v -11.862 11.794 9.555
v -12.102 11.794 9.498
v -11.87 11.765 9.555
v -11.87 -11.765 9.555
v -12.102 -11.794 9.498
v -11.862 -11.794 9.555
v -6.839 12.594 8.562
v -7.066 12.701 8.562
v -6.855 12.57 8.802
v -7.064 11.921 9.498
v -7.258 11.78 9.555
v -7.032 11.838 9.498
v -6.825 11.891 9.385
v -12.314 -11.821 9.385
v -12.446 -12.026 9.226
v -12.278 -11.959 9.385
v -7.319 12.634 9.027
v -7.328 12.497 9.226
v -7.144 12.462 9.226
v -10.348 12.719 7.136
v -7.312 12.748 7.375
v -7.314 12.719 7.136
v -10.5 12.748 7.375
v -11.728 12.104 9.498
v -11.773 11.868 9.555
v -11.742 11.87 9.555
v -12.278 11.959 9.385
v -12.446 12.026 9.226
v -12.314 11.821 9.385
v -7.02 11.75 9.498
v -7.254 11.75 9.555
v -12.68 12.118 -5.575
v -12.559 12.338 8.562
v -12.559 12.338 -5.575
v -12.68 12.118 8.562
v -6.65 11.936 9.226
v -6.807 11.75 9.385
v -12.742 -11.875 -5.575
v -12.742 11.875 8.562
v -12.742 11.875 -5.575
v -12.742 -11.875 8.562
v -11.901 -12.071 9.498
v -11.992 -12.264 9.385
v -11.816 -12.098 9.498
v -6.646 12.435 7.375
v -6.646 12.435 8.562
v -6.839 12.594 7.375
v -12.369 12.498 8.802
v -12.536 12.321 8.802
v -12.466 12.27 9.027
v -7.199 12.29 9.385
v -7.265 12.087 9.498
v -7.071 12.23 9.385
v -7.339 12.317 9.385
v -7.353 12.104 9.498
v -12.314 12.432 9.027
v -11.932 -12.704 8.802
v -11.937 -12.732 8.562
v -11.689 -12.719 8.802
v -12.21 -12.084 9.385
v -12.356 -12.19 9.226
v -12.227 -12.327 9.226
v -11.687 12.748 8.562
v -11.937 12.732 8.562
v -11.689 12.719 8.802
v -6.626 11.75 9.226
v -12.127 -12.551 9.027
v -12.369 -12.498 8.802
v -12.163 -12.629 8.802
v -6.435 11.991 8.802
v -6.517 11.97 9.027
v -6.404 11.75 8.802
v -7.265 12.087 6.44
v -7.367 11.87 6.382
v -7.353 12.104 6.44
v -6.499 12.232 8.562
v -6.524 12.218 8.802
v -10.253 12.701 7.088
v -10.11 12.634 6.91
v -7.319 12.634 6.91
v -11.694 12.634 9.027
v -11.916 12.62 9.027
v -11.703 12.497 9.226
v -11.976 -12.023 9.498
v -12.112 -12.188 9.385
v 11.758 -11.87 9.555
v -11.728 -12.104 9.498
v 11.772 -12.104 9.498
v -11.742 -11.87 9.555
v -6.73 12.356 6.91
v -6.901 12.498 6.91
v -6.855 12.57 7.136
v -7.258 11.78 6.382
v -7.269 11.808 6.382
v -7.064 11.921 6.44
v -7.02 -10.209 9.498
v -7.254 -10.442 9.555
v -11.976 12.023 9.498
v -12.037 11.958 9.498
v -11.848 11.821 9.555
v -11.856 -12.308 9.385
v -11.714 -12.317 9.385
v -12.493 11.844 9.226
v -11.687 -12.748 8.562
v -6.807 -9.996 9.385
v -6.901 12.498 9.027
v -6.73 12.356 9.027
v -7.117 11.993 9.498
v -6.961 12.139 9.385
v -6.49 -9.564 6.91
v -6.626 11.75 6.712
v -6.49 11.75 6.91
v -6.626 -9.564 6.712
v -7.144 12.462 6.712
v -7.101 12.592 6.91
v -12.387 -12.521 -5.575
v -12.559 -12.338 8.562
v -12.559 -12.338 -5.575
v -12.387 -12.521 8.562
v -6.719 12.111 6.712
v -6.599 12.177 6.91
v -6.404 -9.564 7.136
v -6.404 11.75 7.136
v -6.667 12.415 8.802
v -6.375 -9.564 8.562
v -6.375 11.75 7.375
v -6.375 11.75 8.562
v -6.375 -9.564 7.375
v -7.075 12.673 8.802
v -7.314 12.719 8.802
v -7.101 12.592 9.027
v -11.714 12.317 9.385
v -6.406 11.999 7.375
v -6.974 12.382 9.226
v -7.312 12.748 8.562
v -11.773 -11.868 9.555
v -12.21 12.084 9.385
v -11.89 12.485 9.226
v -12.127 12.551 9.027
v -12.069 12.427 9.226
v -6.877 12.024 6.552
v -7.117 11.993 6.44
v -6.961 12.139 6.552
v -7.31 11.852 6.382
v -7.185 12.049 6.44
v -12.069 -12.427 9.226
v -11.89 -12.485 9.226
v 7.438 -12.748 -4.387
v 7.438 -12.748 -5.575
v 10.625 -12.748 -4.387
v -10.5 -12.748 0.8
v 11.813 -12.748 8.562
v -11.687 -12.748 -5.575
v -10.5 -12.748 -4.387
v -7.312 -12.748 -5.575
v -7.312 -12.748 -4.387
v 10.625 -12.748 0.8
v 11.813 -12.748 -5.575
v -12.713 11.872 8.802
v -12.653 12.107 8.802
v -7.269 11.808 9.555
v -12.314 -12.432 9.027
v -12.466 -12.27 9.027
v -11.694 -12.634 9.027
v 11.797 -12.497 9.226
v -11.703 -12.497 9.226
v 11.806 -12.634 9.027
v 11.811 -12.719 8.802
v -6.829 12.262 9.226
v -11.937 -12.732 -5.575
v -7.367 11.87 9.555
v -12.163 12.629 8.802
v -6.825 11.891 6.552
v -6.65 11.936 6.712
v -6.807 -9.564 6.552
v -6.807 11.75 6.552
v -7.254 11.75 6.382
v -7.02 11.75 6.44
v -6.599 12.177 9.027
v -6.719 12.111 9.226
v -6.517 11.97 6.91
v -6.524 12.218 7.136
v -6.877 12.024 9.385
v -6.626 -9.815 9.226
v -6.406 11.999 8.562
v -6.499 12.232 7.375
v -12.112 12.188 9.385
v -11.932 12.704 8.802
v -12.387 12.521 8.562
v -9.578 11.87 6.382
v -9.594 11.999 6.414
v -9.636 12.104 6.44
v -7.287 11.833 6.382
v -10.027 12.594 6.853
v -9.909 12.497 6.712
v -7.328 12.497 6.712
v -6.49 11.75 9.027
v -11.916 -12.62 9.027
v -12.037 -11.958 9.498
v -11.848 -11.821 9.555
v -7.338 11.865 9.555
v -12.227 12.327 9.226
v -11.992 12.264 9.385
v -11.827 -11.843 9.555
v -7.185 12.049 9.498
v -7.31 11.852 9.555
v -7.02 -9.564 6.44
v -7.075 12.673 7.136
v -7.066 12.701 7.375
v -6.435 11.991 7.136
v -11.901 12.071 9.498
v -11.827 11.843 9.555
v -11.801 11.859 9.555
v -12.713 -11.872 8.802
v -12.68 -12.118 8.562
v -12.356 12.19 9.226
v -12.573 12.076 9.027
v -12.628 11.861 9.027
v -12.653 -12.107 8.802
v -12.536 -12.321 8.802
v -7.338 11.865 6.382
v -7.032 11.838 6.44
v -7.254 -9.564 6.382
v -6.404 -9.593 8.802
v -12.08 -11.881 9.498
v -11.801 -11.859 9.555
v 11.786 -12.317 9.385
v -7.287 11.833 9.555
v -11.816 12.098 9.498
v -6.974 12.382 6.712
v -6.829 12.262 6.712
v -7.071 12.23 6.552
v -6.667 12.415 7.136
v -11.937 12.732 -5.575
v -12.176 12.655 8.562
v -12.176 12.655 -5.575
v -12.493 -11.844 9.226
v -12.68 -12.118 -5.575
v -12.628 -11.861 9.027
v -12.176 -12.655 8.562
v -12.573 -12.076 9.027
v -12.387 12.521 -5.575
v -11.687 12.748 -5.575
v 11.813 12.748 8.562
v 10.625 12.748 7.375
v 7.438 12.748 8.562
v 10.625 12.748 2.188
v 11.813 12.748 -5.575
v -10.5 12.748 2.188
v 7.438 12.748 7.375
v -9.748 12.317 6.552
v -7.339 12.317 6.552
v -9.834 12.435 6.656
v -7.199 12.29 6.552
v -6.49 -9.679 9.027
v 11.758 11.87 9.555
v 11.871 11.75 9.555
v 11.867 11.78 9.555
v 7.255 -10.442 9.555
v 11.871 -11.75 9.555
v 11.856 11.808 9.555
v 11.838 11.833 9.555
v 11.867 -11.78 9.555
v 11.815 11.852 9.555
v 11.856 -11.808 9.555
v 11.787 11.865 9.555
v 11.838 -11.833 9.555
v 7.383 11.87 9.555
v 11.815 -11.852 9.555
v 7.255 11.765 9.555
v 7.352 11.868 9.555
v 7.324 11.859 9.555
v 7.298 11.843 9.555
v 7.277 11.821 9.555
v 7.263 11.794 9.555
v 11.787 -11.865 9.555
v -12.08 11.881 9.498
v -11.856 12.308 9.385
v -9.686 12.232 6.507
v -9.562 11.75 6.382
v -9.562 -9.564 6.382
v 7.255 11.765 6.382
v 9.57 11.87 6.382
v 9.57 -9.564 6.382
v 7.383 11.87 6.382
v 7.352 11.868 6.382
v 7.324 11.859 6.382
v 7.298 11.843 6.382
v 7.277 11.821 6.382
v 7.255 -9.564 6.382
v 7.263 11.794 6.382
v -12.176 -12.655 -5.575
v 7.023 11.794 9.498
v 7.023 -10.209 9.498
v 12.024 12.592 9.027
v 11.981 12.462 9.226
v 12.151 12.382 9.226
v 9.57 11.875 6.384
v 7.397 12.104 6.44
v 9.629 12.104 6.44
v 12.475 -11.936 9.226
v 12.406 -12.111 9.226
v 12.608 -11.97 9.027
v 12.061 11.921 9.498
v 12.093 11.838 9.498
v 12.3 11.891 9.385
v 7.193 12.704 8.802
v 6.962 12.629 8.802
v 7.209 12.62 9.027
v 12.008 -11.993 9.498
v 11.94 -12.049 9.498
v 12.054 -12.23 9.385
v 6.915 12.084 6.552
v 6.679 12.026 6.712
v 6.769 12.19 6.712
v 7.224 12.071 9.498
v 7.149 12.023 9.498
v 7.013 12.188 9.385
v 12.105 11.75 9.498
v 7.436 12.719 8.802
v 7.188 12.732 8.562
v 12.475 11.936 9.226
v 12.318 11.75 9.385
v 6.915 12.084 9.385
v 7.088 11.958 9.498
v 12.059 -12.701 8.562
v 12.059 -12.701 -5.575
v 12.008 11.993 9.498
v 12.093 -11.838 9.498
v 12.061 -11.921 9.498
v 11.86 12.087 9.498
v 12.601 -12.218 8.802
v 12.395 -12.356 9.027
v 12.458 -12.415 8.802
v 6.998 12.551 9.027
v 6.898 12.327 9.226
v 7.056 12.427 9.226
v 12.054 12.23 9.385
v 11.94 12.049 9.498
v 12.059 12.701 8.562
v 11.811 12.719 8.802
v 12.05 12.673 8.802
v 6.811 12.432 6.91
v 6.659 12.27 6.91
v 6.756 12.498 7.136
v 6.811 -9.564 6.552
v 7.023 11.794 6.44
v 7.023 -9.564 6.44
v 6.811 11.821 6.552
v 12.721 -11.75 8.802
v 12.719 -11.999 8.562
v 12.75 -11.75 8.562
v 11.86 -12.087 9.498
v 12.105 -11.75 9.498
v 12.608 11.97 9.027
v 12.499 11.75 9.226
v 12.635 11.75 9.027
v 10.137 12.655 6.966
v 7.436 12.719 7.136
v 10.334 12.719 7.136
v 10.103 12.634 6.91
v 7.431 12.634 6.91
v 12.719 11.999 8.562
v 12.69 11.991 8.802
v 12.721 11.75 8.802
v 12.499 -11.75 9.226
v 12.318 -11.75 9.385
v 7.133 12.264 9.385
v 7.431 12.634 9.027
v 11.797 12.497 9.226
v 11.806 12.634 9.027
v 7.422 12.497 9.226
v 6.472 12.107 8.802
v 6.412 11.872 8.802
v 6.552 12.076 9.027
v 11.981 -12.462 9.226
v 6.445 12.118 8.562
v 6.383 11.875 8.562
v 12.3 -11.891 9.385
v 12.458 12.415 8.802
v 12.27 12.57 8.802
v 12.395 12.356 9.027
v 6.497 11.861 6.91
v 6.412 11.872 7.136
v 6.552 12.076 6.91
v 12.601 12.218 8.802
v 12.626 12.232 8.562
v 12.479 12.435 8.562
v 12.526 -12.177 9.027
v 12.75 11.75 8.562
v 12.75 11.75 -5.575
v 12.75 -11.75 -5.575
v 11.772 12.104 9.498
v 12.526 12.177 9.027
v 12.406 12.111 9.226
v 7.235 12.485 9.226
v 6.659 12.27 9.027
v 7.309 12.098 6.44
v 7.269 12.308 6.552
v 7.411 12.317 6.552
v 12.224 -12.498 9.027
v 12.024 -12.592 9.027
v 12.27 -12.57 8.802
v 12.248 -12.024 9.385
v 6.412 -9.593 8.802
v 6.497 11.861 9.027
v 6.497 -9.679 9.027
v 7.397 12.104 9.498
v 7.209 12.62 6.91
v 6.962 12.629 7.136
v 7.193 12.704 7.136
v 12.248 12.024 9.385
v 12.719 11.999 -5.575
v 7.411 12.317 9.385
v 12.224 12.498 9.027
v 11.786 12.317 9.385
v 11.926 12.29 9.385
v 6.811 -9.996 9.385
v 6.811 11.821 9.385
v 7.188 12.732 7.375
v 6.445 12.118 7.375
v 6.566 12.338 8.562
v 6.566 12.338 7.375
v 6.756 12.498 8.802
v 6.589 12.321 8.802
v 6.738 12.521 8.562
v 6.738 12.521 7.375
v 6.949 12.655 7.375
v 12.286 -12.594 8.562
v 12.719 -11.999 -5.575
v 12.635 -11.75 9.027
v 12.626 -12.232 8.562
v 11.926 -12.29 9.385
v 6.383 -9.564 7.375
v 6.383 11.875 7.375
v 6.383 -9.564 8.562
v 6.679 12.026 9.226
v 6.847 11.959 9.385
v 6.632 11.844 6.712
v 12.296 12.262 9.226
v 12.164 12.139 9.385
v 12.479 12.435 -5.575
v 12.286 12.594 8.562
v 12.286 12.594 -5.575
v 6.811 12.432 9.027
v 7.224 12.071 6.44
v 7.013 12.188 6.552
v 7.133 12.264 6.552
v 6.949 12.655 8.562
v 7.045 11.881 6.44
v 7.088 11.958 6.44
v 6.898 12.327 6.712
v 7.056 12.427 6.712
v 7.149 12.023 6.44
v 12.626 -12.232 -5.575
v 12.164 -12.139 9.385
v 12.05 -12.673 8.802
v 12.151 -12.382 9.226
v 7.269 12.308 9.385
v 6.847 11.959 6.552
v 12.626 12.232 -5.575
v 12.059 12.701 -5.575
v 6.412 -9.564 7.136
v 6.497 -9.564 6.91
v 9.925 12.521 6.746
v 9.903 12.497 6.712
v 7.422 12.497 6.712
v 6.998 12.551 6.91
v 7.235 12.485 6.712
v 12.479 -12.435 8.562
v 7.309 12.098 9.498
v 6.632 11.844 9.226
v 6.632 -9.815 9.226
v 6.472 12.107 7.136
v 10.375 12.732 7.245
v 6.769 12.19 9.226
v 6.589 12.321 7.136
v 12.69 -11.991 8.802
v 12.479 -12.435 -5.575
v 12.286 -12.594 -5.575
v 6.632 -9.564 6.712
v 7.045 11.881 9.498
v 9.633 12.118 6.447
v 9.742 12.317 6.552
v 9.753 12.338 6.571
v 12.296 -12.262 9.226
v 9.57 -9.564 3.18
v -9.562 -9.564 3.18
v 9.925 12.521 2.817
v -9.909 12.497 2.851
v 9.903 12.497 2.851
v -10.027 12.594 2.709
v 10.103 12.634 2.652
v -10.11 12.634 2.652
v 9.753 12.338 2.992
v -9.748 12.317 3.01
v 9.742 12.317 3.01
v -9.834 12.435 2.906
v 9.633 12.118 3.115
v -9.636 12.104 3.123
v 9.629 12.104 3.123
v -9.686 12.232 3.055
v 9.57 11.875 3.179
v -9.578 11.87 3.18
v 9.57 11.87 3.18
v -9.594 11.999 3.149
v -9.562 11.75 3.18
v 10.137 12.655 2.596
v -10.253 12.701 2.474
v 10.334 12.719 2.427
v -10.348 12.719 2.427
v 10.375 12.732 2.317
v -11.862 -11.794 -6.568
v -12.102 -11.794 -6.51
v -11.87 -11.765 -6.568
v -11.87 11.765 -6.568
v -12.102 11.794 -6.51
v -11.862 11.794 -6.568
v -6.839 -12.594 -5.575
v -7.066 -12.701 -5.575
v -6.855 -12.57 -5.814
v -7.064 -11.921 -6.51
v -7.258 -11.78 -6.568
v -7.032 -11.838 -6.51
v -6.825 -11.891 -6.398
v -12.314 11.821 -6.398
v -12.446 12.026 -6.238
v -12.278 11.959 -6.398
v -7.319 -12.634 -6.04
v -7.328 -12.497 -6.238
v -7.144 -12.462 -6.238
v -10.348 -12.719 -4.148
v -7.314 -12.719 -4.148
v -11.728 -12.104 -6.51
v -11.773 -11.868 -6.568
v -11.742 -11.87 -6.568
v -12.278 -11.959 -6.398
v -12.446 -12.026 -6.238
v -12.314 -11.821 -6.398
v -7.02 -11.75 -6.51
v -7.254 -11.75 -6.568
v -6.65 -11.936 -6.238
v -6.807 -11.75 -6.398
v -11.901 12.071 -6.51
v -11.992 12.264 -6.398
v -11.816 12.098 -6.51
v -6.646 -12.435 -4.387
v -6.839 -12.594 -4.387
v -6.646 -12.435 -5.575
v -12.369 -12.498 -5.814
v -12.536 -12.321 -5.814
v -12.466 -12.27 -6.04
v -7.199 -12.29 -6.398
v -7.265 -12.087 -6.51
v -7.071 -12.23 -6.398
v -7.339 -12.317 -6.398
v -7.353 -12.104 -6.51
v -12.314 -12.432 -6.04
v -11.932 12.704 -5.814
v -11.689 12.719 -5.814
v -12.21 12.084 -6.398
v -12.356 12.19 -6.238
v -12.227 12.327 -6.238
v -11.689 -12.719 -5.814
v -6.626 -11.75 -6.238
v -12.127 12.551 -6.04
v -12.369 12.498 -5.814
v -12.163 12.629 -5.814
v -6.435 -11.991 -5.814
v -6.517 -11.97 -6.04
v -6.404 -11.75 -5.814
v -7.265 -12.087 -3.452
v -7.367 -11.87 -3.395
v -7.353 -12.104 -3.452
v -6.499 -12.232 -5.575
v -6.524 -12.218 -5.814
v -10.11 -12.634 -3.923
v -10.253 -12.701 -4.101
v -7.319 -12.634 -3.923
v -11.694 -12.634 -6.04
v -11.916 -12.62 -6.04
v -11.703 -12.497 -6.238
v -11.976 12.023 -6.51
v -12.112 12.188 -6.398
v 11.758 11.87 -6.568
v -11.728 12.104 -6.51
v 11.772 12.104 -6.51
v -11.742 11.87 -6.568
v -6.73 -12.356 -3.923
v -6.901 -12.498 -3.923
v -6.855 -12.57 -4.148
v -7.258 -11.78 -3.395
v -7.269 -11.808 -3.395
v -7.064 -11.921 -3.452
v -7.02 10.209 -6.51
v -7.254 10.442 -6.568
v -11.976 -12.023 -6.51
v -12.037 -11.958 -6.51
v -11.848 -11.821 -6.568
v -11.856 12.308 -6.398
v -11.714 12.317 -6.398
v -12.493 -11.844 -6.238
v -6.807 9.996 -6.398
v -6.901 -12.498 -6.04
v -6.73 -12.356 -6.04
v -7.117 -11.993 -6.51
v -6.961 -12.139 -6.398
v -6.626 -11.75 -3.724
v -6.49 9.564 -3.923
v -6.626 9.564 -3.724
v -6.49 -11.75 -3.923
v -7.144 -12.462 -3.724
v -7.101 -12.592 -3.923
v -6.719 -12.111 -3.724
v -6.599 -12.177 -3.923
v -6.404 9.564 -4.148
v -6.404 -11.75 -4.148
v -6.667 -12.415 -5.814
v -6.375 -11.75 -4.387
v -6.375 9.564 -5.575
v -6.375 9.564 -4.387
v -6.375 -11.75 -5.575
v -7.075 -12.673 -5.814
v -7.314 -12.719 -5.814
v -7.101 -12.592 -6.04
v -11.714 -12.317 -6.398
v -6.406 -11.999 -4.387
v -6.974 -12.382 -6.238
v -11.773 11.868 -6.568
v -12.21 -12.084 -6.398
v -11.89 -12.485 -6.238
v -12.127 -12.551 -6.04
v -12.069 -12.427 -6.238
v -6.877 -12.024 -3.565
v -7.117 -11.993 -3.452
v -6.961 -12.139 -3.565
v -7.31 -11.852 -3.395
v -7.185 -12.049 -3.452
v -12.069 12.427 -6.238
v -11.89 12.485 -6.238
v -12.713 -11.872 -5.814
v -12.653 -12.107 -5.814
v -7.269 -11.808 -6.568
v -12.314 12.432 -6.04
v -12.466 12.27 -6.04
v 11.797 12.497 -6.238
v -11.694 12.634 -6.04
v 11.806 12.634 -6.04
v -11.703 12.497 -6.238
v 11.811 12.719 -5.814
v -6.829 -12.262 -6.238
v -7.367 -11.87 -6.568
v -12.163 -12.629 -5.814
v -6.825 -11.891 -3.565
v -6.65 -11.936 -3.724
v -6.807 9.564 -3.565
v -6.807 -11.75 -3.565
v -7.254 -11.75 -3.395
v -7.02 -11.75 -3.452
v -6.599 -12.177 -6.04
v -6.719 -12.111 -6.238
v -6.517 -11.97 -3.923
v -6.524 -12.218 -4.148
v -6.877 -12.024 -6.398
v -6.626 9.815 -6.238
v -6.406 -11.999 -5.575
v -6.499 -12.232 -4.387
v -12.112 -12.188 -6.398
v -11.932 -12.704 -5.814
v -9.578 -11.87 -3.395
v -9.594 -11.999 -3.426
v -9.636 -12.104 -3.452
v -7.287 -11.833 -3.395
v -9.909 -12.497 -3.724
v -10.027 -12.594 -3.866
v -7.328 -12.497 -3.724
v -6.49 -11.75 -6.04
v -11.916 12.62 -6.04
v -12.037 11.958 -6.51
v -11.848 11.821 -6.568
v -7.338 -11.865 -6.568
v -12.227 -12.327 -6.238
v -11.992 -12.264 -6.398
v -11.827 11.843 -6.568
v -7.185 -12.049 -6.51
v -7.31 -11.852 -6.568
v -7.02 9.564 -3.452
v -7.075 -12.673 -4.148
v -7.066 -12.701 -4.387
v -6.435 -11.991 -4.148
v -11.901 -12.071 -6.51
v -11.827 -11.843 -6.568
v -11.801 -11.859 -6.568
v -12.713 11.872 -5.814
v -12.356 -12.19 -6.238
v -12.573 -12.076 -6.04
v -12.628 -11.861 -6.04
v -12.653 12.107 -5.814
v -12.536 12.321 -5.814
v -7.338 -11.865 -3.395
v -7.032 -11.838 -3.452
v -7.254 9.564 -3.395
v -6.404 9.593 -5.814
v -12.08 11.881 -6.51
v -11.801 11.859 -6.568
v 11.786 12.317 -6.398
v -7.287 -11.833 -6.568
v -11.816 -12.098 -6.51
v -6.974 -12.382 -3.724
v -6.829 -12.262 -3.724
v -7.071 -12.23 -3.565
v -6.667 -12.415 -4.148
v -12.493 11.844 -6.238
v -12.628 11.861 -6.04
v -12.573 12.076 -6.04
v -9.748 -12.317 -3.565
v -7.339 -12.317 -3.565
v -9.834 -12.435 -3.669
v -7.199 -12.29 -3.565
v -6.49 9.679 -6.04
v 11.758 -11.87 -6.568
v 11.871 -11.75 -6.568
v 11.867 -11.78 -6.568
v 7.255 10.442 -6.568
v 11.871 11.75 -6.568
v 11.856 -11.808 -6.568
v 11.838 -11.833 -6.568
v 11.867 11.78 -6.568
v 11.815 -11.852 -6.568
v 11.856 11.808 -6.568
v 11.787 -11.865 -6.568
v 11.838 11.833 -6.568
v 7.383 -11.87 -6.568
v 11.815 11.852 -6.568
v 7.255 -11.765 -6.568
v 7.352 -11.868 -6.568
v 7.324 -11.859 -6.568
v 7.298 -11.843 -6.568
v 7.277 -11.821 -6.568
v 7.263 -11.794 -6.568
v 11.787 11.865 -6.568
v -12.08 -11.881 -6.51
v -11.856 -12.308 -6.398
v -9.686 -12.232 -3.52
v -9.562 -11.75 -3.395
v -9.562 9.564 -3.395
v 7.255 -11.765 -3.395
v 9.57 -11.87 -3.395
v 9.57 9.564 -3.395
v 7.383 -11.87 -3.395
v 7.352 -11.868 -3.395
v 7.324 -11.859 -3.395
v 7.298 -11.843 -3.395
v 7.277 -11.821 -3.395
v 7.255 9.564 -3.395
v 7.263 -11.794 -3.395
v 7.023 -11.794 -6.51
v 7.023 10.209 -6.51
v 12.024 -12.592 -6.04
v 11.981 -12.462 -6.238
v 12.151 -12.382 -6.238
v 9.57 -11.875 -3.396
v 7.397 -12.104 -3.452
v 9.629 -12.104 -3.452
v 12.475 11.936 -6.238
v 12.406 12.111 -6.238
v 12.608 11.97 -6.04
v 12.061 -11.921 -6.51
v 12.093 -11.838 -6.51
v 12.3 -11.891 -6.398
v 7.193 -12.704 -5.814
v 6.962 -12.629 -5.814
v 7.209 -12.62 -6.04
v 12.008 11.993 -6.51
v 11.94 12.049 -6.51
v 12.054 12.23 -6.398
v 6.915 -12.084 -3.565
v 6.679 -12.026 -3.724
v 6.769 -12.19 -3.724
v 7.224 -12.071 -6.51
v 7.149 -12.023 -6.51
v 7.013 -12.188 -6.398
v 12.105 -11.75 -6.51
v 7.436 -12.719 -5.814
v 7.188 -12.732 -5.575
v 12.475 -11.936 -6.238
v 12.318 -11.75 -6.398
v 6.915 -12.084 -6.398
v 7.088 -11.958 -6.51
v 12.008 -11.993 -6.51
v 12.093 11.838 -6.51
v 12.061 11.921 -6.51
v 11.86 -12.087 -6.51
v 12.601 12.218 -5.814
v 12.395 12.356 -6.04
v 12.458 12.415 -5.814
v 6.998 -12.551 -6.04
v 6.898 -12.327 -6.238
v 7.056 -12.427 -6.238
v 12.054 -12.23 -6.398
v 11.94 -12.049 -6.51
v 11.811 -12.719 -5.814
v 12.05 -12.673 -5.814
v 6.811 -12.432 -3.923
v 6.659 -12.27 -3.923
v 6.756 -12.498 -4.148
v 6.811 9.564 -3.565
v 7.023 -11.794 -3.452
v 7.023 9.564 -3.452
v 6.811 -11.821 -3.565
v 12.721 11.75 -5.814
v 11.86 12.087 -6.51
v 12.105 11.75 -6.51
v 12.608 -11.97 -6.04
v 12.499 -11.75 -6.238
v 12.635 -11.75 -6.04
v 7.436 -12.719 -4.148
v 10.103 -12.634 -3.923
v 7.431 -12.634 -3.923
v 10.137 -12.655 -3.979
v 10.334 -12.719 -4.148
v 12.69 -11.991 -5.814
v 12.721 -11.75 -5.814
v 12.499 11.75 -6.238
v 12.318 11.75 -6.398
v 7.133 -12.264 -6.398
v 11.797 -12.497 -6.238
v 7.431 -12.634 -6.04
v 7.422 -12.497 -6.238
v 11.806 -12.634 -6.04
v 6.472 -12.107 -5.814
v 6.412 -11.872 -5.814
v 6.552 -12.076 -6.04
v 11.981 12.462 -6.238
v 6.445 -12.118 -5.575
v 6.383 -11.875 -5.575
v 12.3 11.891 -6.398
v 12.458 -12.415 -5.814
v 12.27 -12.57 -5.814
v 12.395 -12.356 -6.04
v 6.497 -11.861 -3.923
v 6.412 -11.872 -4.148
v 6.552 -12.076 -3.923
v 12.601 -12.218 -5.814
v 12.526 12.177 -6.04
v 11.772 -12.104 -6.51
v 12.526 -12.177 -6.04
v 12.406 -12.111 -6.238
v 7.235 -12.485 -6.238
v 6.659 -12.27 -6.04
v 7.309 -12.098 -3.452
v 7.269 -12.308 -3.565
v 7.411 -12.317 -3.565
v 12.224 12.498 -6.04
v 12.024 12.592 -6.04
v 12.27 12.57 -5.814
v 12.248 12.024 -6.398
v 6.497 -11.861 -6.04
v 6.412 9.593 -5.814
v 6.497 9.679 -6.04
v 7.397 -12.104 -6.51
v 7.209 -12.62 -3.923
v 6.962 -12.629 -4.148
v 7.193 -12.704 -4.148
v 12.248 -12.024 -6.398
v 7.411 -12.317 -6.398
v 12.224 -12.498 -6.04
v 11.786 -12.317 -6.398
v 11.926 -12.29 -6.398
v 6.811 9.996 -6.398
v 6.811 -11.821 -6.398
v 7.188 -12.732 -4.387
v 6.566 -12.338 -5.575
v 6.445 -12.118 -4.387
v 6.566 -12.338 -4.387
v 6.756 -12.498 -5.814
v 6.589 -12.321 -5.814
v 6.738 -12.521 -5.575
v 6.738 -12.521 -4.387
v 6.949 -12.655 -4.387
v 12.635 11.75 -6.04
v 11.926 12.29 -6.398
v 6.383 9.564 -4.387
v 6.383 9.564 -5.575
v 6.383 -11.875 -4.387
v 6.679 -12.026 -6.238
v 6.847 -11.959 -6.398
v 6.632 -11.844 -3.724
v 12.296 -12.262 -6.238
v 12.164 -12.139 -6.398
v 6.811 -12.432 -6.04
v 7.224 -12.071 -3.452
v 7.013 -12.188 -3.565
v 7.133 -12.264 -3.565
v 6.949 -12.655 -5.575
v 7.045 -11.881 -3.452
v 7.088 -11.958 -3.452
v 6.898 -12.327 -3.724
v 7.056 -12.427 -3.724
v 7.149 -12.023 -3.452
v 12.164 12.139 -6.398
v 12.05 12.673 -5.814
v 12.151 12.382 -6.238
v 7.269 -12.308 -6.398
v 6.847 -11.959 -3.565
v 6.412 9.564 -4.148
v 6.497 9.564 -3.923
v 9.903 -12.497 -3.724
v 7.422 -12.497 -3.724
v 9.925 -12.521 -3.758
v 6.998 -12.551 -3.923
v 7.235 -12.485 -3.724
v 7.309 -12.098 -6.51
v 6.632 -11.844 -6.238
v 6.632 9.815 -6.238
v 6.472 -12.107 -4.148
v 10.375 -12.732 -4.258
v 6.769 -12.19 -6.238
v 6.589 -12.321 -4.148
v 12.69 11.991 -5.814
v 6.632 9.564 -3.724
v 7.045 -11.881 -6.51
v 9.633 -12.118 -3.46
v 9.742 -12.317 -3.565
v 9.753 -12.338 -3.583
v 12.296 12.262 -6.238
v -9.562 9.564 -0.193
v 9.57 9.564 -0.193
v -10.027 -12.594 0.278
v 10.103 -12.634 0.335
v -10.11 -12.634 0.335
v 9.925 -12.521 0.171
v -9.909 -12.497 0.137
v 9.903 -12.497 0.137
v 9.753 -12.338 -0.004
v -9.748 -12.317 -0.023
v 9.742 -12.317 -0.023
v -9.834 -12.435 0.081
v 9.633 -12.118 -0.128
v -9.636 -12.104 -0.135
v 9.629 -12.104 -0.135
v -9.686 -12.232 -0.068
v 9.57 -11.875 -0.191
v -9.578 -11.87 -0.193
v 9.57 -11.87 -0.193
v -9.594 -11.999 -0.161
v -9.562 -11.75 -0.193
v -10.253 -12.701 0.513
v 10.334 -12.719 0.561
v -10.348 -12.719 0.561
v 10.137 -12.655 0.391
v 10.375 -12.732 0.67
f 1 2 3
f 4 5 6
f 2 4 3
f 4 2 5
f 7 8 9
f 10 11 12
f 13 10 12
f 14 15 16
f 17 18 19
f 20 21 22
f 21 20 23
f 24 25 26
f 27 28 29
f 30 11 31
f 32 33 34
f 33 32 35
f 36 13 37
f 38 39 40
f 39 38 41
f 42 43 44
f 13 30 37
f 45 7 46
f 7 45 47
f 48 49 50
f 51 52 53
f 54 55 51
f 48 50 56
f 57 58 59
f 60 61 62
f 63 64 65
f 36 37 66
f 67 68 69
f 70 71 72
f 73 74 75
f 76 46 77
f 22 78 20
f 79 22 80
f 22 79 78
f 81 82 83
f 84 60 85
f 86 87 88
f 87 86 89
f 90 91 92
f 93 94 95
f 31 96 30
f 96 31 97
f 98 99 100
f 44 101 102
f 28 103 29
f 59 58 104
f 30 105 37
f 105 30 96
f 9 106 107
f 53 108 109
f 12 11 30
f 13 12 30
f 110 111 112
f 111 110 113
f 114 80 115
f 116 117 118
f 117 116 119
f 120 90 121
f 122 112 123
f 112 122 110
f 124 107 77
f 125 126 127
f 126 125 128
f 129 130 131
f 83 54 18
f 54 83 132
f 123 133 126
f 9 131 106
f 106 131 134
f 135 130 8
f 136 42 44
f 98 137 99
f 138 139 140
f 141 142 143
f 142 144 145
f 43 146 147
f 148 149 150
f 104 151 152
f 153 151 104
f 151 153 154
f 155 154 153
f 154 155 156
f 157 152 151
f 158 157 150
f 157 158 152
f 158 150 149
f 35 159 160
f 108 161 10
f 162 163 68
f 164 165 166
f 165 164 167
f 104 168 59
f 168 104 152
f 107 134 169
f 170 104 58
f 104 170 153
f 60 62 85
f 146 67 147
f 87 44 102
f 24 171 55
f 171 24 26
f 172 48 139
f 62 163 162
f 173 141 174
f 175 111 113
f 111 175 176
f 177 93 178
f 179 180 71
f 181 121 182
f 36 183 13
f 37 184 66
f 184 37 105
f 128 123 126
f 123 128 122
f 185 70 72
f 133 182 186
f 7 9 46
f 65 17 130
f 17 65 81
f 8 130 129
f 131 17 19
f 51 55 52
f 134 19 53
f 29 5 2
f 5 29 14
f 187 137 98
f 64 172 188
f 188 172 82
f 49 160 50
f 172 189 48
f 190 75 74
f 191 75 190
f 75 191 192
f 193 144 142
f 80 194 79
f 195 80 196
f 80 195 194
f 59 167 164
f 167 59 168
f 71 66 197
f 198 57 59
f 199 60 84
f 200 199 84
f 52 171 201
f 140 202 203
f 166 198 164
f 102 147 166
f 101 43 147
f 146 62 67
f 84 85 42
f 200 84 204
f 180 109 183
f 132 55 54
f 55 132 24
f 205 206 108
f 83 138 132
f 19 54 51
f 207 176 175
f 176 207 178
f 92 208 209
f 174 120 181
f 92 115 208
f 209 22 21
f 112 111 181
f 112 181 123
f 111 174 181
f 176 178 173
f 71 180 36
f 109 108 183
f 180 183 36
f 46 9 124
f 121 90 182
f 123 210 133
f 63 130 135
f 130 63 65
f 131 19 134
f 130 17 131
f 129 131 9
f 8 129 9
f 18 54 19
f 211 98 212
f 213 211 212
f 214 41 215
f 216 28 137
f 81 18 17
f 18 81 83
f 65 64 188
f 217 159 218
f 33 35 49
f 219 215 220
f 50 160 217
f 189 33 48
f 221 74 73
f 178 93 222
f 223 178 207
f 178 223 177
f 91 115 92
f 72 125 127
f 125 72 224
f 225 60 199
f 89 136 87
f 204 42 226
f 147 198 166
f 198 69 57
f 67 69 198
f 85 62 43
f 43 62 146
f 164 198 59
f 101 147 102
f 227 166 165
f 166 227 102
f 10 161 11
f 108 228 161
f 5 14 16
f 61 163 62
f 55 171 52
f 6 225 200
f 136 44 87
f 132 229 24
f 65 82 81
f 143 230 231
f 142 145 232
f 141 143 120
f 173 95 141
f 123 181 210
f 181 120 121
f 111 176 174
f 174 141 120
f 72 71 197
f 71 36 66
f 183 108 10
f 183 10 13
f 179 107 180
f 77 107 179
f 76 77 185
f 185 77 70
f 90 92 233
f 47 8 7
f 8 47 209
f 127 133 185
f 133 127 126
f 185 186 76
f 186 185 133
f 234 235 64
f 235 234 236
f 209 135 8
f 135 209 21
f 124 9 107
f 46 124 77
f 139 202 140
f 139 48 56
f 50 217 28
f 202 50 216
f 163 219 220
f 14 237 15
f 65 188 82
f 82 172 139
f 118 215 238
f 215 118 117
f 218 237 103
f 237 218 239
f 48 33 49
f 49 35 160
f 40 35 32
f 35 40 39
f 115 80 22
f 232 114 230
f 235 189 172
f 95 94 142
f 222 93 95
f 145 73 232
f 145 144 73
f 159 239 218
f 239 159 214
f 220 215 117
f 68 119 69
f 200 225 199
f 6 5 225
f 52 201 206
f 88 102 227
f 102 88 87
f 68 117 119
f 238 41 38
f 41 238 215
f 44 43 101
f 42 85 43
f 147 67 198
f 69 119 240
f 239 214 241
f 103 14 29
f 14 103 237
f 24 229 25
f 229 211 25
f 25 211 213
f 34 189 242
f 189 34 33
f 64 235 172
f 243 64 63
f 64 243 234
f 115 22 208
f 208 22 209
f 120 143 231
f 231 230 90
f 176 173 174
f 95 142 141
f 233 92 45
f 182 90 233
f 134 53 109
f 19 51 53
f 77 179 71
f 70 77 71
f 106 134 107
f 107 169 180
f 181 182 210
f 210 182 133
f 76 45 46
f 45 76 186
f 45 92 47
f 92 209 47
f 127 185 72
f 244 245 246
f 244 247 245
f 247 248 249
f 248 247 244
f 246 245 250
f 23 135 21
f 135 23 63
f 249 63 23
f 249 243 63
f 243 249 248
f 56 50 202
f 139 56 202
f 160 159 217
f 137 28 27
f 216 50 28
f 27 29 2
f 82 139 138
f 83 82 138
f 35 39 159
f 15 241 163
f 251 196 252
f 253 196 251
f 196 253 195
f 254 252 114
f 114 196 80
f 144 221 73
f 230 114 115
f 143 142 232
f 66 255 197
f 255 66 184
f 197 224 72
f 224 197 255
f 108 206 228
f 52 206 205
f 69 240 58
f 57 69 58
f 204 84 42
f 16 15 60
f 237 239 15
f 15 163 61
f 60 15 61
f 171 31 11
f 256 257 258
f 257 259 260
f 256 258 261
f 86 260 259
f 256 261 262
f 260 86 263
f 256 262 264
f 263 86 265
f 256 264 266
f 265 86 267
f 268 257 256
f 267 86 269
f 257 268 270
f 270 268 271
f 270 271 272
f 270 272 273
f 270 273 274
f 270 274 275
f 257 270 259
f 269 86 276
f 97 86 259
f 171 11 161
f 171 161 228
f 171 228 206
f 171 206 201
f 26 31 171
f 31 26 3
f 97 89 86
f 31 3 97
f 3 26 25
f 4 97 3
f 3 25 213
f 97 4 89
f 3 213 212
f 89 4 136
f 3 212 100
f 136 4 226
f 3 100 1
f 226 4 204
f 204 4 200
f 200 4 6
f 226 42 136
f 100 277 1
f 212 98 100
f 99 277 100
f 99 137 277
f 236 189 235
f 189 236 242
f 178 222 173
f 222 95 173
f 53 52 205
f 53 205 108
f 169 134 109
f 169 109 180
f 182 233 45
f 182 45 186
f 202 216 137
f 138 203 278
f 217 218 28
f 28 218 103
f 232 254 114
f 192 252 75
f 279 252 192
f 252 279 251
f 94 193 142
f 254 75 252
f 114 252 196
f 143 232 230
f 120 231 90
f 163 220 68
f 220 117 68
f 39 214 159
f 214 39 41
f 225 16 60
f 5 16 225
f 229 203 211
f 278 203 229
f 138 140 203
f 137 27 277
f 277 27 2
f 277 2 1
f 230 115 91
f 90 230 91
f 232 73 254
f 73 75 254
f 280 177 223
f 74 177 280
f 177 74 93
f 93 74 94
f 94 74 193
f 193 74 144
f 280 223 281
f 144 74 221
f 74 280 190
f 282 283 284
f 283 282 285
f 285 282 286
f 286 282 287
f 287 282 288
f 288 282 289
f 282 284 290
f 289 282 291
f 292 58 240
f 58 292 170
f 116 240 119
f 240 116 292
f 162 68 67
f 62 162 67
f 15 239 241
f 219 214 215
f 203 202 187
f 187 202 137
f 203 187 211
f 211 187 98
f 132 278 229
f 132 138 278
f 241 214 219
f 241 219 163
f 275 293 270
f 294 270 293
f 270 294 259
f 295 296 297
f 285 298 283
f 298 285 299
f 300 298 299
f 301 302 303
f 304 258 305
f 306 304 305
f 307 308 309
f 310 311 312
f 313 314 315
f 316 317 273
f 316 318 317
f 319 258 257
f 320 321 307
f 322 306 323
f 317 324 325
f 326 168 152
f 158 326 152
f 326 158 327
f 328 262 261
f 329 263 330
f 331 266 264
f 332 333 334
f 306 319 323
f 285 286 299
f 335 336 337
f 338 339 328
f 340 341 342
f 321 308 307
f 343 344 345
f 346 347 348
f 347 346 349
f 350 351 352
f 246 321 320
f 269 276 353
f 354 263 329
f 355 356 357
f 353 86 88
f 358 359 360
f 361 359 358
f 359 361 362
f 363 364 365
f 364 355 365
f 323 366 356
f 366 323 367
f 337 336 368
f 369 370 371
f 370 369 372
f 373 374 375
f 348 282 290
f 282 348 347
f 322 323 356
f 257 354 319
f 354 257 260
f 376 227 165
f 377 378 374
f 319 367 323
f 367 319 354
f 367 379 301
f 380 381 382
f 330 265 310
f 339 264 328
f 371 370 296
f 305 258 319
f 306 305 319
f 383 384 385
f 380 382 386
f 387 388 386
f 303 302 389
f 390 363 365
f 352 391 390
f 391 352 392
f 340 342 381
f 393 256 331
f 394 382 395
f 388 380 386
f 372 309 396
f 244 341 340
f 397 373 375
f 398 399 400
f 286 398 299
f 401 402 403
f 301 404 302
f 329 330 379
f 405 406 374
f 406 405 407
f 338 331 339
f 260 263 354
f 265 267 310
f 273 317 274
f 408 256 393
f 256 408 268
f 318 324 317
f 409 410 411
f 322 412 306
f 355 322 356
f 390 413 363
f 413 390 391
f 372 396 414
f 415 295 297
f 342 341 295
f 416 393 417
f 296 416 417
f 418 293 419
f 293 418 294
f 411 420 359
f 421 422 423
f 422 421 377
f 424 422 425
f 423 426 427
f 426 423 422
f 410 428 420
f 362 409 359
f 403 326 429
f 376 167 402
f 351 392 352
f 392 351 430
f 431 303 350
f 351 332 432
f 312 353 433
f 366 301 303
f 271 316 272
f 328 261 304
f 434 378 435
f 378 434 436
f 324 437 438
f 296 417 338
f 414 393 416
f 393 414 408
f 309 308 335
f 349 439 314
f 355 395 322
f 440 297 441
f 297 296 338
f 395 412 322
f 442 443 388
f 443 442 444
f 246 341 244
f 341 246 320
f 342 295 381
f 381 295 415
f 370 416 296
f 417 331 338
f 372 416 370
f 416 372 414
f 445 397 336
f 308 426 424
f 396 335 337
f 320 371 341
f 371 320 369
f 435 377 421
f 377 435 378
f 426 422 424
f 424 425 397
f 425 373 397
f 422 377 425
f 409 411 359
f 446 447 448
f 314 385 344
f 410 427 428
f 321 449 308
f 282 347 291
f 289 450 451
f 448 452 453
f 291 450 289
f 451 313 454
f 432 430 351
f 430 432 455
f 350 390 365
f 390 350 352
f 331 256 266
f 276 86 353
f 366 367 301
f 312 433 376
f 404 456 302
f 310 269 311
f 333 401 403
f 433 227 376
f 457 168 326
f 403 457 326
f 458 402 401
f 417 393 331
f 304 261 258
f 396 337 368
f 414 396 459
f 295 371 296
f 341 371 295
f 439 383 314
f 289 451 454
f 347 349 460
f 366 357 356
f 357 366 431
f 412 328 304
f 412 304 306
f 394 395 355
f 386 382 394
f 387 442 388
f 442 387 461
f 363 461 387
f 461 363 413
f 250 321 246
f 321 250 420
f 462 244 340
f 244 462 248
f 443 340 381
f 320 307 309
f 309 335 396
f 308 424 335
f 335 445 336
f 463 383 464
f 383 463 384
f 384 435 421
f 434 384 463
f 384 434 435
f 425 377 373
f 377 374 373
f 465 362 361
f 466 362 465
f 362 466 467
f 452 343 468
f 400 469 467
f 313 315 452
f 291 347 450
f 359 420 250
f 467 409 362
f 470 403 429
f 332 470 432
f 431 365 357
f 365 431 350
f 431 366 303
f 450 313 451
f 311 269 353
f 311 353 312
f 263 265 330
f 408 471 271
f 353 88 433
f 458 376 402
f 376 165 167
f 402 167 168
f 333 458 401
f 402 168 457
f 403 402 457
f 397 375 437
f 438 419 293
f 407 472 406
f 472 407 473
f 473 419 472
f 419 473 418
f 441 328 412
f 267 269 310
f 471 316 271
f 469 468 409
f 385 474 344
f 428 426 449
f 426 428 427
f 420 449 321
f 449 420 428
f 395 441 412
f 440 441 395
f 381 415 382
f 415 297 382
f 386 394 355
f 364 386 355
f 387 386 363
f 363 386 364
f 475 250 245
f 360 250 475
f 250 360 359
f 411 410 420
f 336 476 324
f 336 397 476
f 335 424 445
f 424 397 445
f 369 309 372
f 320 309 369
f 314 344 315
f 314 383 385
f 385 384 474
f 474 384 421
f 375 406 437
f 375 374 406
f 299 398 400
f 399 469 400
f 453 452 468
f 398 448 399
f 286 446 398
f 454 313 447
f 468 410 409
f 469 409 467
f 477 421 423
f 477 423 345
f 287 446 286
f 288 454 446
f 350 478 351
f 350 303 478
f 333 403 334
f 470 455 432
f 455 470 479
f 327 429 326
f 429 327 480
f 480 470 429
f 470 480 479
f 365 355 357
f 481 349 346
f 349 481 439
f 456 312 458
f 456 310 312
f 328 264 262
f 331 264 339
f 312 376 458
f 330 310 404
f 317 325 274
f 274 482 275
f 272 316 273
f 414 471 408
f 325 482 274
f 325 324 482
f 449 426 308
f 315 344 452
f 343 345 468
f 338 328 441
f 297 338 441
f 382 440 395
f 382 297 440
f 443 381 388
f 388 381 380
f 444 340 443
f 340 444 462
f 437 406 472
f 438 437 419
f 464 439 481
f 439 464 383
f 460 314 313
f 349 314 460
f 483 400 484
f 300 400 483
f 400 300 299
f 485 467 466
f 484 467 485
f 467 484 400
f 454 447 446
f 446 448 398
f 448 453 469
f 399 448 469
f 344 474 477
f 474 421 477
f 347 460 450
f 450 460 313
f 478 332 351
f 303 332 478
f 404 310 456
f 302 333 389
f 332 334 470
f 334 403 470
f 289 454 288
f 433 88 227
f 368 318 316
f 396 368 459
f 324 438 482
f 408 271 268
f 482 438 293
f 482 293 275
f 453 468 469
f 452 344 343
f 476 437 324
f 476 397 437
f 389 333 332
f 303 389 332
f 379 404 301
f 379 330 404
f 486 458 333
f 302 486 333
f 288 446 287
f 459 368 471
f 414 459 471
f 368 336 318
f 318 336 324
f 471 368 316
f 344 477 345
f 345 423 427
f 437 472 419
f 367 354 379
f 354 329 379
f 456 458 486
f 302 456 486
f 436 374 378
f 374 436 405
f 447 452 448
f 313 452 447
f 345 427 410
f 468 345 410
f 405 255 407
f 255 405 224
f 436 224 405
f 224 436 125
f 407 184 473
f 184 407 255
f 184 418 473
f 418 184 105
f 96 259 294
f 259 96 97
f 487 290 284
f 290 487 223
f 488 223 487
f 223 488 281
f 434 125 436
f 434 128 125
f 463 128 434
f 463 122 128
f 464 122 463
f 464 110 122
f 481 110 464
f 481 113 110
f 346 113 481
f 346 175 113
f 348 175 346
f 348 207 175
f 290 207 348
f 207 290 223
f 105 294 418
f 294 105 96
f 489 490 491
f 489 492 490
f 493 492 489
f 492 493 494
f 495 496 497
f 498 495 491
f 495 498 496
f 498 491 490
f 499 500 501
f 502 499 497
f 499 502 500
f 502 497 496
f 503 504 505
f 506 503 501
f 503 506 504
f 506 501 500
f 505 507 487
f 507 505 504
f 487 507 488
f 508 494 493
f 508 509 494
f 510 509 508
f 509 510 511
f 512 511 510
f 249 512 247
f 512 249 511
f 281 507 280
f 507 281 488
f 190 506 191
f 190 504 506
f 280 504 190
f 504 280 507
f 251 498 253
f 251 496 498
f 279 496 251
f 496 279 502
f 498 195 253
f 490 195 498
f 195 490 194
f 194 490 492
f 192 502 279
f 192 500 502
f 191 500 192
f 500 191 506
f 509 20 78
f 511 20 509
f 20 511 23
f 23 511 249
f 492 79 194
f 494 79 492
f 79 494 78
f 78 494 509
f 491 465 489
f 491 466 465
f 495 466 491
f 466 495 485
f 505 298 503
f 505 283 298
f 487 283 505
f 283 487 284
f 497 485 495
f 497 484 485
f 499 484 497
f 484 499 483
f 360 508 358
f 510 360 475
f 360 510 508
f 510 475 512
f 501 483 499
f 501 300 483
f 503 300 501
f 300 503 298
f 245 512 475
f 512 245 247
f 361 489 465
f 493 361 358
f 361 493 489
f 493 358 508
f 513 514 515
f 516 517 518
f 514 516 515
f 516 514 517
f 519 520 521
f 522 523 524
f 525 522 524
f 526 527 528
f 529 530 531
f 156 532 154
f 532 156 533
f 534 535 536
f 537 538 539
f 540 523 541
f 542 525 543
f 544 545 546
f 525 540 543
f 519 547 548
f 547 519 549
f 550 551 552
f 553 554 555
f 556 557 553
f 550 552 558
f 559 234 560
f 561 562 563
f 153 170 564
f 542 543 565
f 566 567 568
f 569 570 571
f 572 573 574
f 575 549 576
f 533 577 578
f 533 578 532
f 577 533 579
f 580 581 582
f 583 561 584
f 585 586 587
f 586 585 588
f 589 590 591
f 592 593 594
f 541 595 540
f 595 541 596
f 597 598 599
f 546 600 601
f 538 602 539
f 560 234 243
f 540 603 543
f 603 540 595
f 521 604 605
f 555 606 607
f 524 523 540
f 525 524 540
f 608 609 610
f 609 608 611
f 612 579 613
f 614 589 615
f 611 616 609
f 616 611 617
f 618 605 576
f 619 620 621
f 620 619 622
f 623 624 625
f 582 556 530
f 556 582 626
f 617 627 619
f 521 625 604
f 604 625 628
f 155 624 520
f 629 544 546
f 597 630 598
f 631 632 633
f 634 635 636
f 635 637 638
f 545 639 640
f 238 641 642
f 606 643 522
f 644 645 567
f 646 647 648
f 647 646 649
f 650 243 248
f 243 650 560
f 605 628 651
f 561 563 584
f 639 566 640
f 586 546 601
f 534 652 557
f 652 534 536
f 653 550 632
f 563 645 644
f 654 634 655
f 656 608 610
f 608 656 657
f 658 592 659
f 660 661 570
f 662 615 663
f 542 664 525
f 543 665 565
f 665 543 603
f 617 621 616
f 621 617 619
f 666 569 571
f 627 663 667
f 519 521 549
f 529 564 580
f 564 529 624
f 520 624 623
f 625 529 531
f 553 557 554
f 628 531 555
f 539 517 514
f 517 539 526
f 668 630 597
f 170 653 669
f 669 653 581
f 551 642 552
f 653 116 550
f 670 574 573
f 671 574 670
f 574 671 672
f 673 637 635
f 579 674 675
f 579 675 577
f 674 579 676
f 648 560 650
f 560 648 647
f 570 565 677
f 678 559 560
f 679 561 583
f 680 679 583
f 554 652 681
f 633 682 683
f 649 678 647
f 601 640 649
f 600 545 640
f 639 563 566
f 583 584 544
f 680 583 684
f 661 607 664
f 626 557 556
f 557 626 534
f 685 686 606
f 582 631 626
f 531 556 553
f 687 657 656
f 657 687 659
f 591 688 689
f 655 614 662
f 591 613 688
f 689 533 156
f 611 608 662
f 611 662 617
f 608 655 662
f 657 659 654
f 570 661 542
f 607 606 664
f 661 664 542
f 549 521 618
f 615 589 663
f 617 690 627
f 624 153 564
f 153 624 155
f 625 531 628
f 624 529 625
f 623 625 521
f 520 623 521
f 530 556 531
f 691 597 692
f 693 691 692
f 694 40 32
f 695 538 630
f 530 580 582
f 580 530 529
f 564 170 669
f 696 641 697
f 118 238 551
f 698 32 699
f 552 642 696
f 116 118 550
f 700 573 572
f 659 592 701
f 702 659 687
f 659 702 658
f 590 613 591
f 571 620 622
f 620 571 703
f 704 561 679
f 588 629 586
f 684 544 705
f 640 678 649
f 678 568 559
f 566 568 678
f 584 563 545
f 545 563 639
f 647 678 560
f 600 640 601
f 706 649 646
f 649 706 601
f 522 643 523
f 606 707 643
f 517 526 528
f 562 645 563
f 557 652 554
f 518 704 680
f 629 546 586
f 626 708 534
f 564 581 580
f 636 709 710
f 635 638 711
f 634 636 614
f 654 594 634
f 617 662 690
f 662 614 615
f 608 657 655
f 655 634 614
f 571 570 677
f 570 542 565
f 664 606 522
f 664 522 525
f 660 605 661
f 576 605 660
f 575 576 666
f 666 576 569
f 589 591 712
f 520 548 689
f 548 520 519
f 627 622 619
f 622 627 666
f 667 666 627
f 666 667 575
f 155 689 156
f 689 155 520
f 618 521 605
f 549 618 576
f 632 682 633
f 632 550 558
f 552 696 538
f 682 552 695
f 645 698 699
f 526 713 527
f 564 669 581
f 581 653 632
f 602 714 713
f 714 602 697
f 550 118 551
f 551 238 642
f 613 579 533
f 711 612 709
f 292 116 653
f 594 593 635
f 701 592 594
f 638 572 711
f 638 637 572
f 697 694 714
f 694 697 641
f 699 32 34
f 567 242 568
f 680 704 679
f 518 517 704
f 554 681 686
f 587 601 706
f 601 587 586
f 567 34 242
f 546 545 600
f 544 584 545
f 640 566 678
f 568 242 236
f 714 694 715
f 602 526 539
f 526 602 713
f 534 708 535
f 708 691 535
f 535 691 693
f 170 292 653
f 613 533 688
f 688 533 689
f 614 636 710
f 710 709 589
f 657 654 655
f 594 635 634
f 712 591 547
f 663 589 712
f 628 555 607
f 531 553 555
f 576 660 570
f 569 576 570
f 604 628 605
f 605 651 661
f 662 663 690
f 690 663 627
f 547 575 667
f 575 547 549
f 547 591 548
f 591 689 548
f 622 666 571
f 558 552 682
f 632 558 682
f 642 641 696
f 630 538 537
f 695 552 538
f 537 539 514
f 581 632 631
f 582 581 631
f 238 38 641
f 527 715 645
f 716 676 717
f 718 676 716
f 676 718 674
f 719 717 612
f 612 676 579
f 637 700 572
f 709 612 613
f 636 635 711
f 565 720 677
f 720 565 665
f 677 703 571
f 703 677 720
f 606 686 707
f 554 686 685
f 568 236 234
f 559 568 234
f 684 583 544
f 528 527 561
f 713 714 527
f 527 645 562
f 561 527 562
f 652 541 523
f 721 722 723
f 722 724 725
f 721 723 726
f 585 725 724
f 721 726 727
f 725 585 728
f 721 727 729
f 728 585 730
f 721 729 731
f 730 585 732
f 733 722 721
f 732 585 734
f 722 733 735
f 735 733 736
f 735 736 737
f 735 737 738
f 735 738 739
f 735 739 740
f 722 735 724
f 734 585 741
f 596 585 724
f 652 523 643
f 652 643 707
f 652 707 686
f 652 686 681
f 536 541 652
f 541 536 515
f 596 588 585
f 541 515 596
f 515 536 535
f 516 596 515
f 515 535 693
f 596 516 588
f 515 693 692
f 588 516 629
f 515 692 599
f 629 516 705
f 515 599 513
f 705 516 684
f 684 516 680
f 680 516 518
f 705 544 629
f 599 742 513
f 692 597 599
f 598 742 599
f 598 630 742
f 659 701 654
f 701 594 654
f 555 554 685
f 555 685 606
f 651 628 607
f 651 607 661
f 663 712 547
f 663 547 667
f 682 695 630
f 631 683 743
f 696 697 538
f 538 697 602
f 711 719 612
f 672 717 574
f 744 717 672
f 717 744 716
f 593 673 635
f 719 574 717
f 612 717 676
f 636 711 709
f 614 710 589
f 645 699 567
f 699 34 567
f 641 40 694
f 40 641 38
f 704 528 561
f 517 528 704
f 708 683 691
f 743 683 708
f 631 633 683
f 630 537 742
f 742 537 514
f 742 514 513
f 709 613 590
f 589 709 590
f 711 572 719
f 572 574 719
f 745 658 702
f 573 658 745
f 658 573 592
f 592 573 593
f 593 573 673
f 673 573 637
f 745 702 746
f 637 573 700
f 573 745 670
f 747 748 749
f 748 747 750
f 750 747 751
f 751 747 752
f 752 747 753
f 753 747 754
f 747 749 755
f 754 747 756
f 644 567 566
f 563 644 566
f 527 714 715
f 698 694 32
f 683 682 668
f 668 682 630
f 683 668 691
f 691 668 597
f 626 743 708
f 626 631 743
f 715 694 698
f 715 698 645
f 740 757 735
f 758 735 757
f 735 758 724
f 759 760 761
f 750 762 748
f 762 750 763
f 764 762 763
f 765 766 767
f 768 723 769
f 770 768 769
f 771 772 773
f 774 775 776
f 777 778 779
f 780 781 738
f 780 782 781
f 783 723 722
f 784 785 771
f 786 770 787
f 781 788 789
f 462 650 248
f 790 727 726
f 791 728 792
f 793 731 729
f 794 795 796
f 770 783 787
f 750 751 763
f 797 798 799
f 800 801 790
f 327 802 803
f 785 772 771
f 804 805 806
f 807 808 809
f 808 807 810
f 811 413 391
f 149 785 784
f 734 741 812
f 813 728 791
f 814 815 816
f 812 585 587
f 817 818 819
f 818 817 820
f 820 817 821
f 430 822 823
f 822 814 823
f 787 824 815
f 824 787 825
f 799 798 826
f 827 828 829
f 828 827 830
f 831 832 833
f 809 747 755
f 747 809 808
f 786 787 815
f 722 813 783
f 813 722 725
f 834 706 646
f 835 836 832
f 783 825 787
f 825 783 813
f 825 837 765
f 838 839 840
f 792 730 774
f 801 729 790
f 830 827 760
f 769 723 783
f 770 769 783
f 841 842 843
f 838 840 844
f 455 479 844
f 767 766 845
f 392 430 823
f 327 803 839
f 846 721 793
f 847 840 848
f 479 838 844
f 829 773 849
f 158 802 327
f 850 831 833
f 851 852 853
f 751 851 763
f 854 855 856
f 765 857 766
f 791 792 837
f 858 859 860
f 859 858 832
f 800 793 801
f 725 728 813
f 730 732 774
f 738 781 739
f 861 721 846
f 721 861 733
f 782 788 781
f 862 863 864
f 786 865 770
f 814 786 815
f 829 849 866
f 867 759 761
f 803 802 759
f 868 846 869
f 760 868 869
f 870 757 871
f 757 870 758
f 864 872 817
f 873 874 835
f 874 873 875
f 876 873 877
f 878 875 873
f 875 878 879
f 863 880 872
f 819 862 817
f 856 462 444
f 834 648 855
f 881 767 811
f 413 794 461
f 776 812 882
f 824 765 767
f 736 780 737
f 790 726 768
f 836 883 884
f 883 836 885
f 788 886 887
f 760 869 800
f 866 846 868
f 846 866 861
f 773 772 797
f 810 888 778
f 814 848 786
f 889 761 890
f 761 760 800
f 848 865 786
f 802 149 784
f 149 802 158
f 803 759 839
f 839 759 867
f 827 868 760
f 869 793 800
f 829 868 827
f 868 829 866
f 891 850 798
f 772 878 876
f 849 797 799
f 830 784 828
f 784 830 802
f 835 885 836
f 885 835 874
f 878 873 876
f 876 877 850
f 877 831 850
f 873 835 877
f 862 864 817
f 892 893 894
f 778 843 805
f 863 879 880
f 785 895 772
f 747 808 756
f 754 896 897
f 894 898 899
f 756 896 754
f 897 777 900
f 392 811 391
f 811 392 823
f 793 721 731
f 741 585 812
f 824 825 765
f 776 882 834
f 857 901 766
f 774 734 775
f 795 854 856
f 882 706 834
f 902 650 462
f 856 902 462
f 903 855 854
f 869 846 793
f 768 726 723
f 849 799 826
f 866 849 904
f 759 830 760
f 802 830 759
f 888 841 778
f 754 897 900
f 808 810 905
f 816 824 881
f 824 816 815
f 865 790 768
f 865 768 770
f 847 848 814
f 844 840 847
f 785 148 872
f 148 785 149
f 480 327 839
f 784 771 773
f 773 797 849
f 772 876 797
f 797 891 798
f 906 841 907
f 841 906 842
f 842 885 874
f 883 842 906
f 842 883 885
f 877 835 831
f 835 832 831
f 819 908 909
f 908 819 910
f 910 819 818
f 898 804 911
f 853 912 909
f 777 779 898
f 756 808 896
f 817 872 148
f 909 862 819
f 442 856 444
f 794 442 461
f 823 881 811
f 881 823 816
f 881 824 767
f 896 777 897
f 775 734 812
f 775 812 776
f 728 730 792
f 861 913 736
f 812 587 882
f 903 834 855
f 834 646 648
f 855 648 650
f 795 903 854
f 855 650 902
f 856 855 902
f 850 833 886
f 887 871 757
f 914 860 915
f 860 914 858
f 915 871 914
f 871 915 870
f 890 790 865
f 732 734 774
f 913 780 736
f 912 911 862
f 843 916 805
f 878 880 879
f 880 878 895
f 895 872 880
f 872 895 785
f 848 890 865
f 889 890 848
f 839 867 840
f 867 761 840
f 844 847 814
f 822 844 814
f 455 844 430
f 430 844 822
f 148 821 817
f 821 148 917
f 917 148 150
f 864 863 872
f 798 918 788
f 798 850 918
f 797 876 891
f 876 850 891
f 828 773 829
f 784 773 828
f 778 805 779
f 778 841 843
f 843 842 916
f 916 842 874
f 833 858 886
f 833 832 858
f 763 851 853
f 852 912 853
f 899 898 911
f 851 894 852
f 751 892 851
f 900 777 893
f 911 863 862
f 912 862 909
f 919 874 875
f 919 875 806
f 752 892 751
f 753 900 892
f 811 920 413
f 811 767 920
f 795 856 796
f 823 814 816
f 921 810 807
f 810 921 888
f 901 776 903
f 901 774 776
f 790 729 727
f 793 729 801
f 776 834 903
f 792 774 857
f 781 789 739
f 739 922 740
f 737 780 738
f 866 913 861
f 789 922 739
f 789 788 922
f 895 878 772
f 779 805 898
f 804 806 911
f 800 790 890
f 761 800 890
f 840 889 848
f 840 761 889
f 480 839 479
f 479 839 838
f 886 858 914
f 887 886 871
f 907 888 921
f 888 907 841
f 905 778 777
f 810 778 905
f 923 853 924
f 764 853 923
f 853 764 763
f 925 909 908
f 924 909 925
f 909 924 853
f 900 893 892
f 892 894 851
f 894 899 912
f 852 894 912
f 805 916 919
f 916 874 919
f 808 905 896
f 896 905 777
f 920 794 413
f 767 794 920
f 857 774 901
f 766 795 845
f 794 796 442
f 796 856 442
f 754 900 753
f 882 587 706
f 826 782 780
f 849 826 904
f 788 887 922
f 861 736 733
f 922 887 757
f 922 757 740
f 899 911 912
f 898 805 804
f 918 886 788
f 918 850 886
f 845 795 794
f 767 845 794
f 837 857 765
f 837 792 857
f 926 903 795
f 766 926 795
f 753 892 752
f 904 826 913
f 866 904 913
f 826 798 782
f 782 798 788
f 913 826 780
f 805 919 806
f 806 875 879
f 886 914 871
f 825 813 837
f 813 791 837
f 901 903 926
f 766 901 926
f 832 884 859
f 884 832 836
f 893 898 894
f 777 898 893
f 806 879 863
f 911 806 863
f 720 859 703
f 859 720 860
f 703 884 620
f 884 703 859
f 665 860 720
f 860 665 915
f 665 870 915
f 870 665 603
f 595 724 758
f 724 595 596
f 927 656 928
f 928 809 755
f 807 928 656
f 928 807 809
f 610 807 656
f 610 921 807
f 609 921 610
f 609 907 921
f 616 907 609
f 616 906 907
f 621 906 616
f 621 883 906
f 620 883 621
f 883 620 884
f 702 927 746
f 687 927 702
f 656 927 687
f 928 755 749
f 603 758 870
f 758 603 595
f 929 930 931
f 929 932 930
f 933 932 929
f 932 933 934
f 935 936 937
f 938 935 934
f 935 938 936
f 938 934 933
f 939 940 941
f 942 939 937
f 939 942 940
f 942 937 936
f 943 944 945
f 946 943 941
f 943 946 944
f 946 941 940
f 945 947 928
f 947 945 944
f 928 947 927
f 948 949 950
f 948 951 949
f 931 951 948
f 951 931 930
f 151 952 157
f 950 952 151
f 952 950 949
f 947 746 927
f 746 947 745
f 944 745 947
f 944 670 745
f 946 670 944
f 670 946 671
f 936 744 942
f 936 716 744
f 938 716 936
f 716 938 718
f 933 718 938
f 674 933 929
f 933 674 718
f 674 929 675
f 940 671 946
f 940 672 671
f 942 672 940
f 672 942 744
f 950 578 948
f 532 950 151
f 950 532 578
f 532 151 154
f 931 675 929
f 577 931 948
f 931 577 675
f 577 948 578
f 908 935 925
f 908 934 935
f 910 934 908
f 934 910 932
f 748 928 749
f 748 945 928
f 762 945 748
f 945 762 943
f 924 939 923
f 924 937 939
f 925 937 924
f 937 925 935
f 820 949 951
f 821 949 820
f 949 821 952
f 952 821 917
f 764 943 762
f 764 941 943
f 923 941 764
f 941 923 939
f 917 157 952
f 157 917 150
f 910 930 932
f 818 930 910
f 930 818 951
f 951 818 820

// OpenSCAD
// file: lib/cover.scad
//fine = true; 
fine = false; 

$fn = fine ? 100 : 25;

roundcorner = 2; 

horn_arc = 45;

horn_diameter = 5;

base_size = 25.5;
plate_thickness = base_size / 8;




module bar(roundcorner = 1, x = base_size, y = base_size, z = plate_thickness, color = "purple") {
    translate([roundcorner, roundcorner, roundcorner]) {
        color(color) {
            minkowski() {
                cube([x - (roundcorner * 2), y - (roundcorner * 2), z - (roundcorner * 2)]);
                sphere(d = roundcorner * 2);
            }
        }
    }
}



    
module cover(x_ness = 1, y_ness = 1) {

    // base plate
    bar(x = base_size * x_ness, y = base_size * y_ness, z = plate_thickness);

    // sides
    bar(color = "green", x = plate_thickness, y = base_size * y_ness, z = plate_thickness * 3);
    translate([(base_size * x_ness) - plate_thickness, 0, 0]) 
        bar(color = "red", x = plate_thickness, y = base_size * y_ness, z = plate_thickness * 3);
    bar(color = "blue", x = base_size * x_ness, y = plate_thickness, z = plate_thickness * 3);
    
    // cover
    translate([0, 0, plate_thickness * 2]) {
        bar(color = "grey", x = plate_thickness * 2, y = base_size * y_ness);
        translate([(base_size * x_ness) - (plate_thickness * 2), 0, 0]) 
            bar(color = "black", x = plate_thickness * 2, y = base_size * y_ness);
        bar(color = "white", x = base_size * x_ness, y = plate_thickness * y_ness);

    }

}
// main file
fine = true;
//fine = false;

$fn = fine ? 100 : 25;



base_size = 25.5;
plate_thickness = base_size / 8;


fudge = 0.2;

use <lib/cover.scad>;

translate([-1 * (base_size / 2), -1 * (base_size / 2), 0]) 
    cover(1, 1, fudge);

rotate([0, 180, 180]) 
    translate([-1 * (base_size / 2), -1 * (base_size / 2), -1 * (plate_thickness - fudge)]) 
        cover(1, 1, fudge);
